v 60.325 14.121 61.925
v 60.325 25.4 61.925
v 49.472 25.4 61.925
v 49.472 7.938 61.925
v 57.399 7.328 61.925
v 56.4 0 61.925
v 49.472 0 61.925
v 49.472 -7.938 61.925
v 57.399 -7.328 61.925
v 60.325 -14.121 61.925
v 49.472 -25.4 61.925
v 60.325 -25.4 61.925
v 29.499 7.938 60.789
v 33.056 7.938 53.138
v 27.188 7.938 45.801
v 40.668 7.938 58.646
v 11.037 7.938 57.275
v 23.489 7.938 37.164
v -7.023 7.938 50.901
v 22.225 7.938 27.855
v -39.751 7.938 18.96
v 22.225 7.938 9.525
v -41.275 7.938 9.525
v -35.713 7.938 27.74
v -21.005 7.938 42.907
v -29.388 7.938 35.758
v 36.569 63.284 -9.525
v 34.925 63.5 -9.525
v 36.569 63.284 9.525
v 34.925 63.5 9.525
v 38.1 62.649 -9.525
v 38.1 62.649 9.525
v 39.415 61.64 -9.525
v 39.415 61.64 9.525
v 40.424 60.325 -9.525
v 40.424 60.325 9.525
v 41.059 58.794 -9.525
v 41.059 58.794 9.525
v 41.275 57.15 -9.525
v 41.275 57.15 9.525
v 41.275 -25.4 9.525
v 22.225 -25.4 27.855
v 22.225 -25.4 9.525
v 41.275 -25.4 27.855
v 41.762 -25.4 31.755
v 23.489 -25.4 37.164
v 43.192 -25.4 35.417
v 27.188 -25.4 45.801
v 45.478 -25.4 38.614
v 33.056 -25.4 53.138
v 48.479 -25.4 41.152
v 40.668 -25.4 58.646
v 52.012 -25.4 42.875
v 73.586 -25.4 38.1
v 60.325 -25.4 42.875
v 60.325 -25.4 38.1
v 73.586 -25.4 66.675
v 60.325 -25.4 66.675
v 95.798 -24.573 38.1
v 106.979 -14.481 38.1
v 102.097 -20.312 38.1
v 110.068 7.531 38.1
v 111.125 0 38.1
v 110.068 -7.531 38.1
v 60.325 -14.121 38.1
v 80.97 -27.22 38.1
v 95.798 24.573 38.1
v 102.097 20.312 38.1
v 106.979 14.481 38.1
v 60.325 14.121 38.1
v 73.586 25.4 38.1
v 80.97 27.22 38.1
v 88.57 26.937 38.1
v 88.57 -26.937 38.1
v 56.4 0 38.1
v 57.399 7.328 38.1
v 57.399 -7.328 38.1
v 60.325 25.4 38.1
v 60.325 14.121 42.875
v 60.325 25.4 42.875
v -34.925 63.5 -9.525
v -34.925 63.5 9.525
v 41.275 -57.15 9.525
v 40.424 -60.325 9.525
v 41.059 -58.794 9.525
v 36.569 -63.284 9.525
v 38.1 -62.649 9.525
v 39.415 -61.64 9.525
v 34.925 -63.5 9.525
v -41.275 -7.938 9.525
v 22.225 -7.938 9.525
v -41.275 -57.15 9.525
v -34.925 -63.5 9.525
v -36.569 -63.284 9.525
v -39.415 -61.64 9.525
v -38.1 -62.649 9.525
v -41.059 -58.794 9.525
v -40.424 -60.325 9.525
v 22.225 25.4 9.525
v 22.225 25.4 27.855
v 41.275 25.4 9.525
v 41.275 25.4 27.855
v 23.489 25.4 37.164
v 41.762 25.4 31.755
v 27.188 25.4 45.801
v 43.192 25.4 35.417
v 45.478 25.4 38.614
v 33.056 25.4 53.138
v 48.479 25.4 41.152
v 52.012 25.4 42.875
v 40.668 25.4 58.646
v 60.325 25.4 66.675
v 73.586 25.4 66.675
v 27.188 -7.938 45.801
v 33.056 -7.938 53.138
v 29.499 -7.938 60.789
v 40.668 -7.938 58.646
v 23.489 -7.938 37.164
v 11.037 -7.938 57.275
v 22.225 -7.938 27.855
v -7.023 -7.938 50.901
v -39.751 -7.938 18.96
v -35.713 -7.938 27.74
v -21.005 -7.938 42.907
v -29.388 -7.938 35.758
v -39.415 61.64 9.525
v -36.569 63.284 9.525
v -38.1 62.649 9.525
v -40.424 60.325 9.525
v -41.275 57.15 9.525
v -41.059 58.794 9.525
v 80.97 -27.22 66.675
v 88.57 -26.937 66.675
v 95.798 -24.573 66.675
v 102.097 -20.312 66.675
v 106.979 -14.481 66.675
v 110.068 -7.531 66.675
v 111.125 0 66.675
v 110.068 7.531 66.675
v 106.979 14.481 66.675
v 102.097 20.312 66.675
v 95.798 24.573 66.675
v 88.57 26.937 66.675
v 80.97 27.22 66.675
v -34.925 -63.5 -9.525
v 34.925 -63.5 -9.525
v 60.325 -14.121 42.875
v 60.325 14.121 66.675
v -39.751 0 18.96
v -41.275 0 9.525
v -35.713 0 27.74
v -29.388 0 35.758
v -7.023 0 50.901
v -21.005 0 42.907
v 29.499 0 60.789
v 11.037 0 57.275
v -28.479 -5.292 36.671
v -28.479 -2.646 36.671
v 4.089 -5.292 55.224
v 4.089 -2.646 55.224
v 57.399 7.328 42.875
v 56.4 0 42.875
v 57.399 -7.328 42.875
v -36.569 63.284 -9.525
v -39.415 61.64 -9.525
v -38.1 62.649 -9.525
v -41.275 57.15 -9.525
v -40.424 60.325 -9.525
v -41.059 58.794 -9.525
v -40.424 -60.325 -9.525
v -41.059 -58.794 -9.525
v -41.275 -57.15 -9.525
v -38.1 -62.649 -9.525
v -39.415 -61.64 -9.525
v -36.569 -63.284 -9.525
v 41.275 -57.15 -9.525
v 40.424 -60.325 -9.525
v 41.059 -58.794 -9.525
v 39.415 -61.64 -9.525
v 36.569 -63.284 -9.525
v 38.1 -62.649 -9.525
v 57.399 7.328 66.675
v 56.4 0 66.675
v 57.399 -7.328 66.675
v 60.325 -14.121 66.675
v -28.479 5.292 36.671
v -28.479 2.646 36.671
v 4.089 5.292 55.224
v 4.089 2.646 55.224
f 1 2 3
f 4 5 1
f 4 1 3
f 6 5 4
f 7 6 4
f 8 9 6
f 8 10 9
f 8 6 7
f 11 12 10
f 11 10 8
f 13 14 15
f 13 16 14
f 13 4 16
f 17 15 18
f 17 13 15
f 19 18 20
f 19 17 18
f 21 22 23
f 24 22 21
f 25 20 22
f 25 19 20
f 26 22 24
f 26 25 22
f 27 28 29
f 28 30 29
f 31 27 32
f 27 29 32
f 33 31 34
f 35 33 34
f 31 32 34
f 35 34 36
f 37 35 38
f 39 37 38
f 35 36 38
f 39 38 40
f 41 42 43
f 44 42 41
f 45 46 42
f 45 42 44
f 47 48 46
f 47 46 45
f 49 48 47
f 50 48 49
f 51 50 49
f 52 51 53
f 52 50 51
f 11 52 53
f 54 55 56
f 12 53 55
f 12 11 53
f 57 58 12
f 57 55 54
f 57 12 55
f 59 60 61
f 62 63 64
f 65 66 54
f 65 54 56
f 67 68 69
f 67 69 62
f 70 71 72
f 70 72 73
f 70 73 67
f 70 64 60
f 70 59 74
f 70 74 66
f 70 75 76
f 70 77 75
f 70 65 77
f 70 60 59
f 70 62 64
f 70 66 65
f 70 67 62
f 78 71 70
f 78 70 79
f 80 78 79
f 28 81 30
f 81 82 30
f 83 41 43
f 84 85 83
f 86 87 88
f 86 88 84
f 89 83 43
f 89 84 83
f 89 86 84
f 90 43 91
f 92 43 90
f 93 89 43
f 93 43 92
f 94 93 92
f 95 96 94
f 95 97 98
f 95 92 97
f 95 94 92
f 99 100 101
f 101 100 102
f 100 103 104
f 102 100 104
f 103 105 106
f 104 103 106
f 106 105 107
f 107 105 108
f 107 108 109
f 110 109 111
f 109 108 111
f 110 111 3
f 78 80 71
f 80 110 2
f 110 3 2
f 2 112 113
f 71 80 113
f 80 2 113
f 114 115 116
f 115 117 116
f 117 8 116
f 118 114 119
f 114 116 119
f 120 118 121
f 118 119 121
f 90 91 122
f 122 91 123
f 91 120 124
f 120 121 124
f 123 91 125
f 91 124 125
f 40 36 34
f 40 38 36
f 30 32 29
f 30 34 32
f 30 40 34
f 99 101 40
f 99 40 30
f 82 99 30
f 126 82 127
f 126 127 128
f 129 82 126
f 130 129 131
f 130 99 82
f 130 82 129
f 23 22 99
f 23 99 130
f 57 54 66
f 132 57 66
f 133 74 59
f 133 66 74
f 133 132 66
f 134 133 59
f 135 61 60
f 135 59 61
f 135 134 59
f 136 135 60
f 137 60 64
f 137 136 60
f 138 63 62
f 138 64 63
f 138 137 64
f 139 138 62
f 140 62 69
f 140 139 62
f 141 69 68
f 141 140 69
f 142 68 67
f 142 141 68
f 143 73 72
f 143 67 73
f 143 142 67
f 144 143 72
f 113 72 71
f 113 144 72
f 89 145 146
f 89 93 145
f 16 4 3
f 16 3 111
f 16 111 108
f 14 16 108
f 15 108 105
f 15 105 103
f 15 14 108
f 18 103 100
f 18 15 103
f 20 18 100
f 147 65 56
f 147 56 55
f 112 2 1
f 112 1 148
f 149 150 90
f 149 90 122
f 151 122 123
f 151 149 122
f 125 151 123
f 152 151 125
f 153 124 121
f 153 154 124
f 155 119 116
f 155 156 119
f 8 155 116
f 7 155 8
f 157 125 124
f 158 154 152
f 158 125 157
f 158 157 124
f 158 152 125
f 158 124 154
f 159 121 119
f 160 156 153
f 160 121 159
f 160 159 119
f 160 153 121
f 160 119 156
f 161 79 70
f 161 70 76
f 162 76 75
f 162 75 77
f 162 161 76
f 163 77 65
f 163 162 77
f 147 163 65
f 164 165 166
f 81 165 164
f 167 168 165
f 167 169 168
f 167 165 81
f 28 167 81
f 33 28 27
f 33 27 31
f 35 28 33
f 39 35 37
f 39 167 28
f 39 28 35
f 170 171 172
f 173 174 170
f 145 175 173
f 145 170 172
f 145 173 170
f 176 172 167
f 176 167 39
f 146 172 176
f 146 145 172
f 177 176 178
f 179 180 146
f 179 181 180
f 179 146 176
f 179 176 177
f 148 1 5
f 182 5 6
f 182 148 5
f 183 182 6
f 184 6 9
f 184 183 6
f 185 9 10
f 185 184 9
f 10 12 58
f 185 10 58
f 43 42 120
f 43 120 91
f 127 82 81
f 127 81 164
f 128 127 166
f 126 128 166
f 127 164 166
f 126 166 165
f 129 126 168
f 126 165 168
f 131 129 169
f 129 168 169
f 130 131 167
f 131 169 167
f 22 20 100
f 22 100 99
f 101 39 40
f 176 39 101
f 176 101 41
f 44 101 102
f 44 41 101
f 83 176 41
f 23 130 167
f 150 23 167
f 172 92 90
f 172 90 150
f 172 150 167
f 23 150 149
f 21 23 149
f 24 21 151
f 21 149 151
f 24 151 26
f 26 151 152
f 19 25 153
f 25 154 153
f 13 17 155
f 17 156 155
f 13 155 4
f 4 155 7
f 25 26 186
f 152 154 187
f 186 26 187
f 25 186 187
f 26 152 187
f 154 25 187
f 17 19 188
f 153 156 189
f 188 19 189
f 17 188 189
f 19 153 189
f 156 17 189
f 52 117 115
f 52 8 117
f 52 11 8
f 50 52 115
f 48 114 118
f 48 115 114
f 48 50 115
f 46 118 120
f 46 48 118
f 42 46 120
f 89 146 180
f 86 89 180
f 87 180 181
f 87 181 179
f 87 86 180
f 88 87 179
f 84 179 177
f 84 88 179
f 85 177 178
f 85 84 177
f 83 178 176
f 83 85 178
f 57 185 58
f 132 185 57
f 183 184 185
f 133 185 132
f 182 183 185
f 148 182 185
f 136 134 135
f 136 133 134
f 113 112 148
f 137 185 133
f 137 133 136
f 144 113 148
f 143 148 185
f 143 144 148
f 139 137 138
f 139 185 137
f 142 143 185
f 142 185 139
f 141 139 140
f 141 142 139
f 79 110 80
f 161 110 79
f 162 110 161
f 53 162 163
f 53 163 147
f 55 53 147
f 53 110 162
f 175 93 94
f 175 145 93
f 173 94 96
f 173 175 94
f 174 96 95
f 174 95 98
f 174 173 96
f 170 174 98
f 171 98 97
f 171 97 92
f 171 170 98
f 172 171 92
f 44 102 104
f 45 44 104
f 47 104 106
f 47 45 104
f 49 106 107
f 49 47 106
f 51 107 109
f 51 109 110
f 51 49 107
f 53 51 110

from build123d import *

# Parameters (mm, degrees)
F1_DEPTH = 63.5
F0_W     = 23.437294
F0_H     = 19.05
F0_H_2   = 4.7498
F0_H_3   = 4.7752
F2_DEPTH = 25.4
F3_DEPTH = 7.9375
F5_R     = 6.35


with BuildPart() as f1:
    # F0 (on Front) → F1 (new body, symmetric)
    with BuildSketch(Plane.XZ):
        Polygon((-41.275, -9.525), (41.275, -9.525), (41.275, 9.525), (22.225, 9.525), (-41.275, 9.525), align=None)
    extrude(amount=F1_DEPTH, both=True)

    # F0 (on Front) → F2 (join, symmetric)
    with BuildSketch(Plane.XZ):
        with BuildLine():
            Line((22.225, 9.525), (41.275, 9.525))
            Line((41.275, 9.525), (41.275, 27.854561))
            ThreePointArc((41.275, 27.854561), (44.235343, 37.086423), (52.012294, 42.8752))
            Line((52.012294, 42.8752), (60.325, 42.8752))
            Line((60.325, 42.8752), (60.325, 61.9252))
            Line((60.325, 61.9252), (49.472294, 61.9252))
            ThreePointArc((49.472294, 61.9252), (29.874558, 49.667536), (22.225, 27.854561))
            Line((22.225, 27.854561), (22.225, 9.525))
        make_face()
        with Locations((72.043647, 52.4002)):
            Rectangle(F0_W, F0_H)
        with Locations((72.043647, 64.3001)):
            Rectangle(F0_W, F0_H_2)
        with Locations((72.043647, 40.4876)):
            Rectangle(F0_W, F0_H_3)
    extrude(amount=F2_DEPTH, both=True)

    # F0 (on Front) → F3 (join, symmetric)
    with BuildSketch(Plane.XZ):
        with BuildLine():
            add(Edge.make_bspline(
                [(-41.275, 9.525), (-40.683046, 39.880011), (0, 62.237594), (49.472294, 61.9252)],
                knots=[0, 0, 0, 0, 104.789562, 104.789562, 104.789562, 104.789562], degree=3))
            Line((-41.275, 9.525), (22.225, 9.525))
            Line((22.225, 9.525), (22.225, 27.854561))
            ThreePointArc((22.225, 27.854561), (29.874558, 49.667536), (49.472294, 61.9252))
        make_face()
    extrude(amount=F3_DEPTH, both=True)

    # F0 (on Front) → F4 (revolve)
    with BuildSketch(Plane.XZ):
        Polygon((83.762294, 66.675), (83.762294, 61.9252), (83.762294, 42.8752), (83.762294, 38.1), (111.125, 38.1), (111.125, 66.675), align=None)
    revolve(axis=Axis((83.762294, 0, 52.4002), (0, 0, 1)))

    # F5
    f5_edges = [f1.edges().sort_by_distance(p)[0] for p in [
        (41.275, -63.5, 0),
        (41.275, 63.5, 0),
        (-41.275, 63.5, 0),
        (-41.275, -63.5, 0),
    ]]
    fillet(f5_edges, radius=F5_R)


solid = f1.part
